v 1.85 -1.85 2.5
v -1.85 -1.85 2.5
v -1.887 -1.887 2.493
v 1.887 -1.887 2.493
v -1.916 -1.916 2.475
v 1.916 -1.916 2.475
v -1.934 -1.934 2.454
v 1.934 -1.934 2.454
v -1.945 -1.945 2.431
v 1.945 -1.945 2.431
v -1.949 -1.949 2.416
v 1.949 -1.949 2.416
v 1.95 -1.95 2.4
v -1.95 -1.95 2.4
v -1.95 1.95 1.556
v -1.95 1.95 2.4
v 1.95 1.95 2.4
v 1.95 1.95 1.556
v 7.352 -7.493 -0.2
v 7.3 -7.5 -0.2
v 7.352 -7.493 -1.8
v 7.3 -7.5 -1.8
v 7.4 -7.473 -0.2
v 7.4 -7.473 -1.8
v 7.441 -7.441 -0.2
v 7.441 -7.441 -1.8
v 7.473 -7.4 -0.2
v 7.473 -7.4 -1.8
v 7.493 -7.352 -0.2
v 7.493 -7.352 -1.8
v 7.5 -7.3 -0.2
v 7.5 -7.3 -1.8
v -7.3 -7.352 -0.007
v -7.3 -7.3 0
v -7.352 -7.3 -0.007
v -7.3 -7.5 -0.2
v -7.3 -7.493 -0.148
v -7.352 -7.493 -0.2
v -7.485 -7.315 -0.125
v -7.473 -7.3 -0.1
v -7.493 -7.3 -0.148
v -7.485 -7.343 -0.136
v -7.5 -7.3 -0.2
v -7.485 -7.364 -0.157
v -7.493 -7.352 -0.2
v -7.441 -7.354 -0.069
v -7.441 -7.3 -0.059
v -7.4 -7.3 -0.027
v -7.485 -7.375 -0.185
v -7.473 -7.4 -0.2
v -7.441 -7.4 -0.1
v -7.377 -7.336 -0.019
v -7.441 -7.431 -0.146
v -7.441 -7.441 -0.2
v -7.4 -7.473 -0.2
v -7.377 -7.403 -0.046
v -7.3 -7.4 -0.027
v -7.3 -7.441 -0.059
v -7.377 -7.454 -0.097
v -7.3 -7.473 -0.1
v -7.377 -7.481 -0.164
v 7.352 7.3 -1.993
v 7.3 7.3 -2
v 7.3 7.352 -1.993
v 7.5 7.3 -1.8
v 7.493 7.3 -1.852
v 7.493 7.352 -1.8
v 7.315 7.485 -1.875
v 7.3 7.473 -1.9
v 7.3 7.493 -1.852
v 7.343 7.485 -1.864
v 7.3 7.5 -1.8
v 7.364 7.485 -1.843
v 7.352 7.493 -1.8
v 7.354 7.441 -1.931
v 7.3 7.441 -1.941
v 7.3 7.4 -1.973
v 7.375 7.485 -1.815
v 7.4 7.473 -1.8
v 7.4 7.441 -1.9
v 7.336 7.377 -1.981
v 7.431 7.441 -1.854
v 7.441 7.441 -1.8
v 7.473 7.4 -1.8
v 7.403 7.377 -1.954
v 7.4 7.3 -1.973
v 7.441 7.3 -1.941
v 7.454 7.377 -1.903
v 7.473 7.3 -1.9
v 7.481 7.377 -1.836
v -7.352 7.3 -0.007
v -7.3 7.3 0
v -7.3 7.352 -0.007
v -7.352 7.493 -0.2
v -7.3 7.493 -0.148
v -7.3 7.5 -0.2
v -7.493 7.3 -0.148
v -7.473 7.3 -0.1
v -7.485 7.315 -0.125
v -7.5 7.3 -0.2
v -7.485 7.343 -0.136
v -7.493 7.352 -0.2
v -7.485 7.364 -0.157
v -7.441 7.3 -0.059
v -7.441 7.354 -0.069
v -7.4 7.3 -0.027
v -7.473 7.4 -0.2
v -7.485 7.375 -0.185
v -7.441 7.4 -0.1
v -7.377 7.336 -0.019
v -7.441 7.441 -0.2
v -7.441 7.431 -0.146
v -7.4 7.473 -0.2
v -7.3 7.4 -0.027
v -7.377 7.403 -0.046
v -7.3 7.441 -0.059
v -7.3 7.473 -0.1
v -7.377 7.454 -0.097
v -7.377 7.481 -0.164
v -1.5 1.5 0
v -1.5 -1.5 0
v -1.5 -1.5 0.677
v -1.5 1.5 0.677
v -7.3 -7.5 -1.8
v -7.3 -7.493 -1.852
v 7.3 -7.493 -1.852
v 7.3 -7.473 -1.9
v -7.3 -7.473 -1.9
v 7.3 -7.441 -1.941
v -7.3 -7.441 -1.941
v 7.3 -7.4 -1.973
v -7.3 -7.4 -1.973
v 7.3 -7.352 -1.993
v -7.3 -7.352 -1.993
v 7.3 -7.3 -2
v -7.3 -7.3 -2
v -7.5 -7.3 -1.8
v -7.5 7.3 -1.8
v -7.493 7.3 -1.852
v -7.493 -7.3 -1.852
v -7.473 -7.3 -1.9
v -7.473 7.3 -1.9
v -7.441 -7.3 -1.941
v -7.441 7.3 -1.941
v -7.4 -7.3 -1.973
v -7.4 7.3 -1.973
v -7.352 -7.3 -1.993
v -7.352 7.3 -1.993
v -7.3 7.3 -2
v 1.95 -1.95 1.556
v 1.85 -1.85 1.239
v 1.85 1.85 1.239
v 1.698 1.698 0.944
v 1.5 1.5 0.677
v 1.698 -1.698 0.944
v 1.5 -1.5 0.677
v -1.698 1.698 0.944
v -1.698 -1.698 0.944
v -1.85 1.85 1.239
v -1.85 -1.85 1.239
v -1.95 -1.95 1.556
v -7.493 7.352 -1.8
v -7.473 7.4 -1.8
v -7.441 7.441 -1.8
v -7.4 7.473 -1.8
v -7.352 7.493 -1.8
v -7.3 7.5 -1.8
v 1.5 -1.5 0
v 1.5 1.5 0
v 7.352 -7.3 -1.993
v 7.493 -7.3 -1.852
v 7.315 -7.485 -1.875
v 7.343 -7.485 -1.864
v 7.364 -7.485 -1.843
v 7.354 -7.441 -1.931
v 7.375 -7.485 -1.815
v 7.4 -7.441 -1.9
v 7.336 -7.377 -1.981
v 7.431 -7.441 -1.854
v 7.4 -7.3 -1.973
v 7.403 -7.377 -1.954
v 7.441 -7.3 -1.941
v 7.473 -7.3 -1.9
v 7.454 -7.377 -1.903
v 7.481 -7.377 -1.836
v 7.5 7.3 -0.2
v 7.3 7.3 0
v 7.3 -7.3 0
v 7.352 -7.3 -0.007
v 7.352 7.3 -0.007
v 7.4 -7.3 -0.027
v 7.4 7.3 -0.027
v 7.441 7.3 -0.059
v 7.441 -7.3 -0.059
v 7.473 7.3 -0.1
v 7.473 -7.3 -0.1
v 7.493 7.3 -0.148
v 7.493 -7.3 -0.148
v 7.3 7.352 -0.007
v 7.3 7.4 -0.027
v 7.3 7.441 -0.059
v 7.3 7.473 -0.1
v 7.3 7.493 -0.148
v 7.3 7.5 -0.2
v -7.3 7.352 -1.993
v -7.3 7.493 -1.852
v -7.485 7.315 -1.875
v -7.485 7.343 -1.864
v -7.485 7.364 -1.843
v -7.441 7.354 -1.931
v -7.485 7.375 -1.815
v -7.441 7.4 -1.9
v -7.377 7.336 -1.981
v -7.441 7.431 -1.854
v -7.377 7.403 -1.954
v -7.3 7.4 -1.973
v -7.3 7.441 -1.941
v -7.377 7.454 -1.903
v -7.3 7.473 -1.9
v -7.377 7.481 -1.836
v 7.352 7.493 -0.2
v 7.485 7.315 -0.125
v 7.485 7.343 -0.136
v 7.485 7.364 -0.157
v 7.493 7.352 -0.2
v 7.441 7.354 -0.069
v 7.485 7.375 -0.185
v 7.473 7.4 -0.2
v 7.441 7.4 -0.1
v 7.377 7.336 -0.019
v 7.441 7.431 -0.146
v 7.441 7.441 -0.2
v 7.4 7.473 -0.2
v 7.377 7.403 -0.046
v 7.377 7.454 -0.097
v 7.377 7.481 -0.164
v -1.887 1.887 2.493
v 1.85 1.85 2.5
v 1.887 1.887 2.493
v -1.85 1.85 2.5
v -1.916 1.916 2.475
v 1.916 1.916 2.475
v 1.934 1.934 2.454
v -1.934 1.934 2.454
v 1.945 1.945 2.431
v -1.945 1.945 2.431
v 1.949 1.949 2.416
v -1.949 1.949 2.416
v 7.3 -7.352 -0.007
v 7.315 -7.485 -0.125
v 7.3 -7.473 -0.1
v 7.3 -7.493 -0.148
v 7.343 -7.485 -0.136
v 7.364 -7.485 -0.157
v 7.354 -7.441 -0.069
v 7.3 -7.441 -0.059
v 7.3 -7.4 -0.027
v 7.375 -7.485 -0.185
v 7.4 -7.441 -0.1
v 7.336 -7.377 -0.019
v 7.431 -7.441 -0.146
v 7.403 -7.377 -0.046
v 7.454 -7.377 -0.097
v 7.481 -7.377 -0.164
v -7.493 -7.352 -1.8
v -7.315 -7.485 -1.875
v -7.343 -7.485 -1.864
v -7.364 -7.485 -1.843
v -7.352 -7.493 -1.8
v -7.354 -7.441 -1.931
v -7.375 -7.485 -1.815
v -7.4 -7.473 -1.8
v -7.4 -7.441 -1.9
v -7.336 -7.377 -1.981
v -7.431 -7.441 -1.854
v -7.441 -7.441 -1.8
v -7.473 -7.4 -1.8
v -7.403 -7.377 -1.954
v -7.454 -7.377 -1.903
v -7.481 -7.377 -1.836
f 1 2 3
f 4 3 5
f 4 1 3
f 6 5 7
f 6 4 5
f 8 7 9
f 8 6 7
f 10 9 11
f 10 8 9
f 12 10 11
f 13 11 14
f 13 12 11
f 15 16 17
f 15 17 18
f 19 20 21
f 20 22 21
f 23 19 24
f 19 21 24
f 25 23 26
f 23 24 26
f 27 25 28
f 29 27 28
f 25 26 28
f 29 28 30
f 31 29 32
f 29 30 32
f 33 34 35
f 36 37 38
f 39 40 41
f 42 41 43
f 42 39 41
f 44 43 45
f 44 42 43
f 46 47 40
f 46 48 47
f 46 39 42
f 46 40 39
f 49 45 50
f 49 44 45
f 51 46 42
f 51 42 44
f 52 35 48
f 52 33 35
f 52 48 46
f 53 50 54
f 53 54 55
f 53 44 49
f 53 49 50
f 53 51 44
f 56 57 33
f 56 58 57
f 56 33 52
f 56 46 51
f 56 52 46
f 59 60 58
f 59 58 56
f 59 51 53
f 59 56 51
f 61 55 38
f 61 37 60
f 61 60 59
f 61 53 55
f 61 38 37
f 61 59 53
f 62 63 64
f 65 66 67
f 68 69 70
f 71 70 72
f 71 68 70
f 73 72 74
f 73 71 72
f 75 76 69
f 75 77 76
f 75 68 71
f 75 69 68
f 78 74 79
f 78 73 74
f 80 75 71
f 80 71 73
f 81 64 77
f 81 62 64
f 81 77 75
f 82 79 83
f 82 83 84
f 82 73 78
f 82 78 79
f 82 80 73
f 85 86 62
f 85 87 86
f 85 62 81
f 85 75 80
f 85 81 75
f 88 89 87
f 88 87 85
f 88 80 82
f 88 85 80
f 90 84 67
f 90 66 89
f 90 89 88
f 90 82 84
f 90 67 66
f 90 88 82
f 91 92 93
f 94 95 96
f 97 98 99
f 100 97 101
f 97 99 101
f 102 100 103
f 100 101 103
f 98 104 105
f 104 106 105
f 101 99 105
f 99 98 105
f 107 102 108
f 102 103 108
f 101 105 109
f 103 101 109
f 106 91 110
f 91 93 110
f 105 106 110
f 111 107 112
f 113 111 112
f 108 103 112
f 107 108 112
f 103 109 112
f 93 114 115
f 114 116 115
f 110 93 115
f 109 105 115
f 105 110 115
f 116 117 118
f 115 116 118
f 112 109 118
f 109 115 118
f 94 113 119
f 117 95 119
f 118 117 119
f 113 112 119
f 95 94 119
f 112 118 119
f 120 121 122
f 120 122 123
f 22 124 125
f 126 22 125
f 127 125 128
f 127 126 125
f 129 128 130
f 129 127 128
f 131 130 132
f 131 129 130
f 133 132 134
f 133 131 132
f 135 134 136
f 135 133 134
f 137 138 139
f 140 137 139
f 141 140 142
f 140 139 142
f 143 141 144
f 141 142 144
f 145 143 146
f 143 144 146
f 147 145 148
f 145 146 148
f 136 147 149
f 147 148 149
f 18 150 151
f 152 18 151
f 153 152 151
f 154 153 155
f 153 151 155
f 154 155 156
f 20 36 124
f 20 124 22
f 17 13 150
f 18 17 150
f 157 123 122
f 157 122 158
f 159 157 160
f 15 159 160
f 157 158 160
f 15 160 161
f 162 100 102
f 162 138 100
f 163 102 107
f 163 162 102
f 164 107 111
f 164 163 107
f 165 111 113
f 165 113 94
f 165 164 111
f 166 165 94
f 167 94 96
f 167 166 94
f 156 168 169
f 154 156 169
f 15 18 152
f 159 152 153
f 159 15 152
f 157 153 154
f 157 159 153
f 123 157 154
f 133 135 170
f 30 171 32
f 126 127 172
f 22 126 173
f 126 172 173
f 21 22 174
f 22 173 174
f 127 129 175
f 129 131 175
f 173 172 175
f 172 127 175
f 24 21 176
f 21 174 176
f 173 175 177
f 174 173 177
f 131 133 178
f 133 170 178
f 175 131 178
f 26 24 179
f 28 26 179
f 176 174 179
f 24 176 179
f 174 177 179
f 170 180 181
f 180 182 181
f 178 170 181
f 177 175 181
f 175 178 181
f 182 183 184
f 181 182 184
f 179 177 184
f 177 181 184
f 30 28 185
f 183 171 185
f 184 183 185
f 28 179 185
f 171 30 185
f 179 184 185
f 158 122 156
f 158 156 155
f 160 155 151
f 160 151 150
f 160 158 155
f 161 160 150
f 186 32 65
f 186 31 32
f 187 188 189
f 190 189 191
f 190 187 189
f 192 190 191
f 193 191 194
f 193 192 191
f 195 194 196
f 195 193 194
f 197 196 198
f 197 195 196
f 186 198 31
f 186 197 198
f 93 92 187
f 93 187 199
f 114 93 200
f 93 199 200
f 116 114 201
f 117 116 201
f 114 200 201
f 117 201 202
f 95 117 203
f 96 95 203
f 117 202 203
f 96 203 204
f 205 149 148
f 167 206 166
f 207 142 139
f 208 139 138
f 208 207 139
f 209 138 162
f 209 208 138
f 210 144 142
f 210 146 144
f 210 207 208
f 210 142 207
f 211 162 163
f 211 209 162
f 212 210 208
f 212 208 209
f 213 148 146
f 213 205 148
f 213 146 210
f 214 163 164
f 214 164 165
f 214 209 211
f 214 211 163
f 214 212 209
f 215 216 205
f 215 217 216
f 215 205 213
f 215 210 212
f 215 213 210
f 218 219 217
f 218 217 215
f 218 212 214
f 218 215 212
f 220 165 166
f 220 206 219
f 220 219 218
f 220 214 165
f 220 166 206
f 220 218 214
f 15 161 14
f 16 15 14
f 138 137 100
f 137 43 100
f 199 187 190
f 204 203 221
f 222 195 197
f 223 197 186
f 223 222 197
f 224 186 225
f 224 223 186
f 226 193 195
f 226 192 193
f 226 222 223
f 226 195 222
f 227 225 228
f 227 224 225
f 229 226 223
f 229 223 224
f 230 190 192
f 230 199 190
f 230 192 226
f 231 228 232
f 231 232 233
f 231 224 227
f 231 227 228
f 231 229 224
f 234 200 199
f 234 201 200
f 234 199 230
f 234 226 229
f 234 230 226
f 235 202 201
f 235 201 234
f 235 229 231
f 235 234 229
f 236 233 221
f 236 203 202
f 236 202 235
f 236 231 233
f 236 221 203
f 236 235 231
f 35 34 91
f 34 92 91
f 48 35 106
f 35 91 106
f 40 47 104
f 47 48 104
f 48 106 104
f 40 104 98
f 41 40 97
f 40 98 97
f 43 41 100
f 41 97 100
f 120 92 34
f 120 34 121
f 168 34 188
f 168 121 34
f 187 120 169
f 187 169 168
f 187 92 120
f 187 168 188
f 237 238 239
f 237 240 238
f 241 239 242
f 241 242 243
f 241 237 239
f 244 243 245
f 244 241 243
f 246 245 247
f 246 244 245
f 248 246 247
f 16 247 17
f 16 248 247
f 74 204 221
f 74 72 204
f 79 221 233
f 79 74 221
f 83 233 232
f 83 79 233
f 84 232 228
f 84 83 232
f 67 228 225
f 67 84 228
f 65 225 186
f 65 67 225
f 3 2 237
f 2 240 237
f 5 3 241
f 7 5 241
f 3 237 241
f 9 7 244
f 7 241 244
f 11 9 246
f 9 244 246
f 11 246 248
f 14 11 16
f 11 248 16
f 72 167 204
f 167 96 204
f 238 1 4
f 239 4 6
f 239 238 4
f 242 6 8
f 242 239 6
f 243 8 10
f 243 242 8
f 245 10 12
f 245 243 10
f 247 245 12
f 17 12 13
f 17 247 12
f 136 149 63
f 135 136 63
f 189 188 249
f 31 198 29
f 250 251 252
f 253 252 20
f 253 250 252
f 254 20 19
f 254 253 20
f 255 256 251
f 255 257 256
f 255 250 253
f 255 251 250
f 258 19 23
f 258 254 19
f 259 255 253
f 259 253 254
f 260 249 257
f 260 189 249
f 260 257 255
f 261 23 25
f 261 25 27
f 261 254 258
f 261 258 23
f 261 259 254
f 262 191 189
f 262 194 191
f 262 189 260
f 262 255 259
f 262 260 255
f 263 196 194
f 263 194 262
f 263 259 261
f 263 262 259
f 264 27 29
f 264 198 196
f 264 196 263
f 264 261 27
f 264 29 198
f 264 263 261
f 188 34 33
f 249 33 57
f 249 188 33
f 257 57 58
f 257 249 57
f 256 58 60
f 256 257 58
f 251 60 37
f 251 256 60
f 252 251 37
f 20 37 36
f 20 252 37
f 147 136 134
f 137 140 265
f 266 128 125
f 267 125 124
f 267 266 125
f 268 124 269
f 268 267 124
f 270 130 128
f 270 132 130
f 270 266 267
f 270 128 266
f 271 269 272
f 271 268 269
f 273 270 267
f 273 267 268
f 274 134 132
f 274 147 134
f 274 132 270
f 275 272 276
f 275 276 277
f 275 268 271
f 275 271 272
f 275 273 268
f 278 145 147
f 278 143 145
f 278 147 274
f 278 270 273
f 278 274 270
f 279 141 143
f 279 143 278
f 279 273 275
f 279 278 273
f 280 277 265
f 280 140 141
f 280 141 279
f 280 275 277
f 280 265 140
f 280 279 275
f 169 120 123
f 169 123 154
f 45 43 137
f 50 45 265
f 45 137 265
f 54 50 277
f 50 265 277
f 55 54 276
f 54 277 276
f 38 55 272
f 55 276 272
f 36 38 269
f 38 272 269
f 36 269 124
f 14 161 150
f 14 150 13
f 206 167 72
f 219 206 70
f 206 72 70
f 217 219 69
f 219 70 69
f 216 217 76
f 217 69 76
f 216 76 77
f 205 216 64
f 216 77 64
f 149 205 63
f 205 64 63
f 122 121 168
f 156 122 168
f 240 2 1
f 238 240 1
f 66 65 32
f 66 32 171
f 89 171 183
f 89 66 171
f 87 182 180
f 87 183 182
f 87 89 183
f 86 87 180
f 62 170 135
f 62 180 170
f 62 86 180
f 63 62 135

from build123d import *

# Parameters (mm, degrees)
SKETCH_1_W                      = 15
SKETCH_1_H                      = 15
EXTRUDE_1_DEPTH                 = 2
SKETCH_2_W                      = 3
SKETCH_2_H                      = 3
EXTRUDE_2_DEPTH                 = 1
EXTRUDE_3_DEPTH                 = 2
EXTRUDE_3_DEPTH_BACK            = 2
CUT_EXTRUDE_1_REACH             = 12.897
CUT_EXTRUDE_1_DIRECTION_2_REACH = 12.897
FILLET_1_R                      = 0.1
FILLET_2_R                      = 0.2


with BuildPart() as part:
    # 草图1 → 凸台-拉伸1 (new body)
    with BuildSketch(Plane.XY):
        Rectangle(SKETCH_1_W, SKETCH_1_H)
    extrude(amount=-EXTRUDE_1_DEPTH)

    # 草图2 → 凸台-拉伸2 (add)
    with BuildSketch(Plane.XY):
        Rectangle(SKETCH_2_W, SKETCH_2_H)
    extrude(amount=EXTRUDE_2_DEPTH)

    # 草图3 → 凸台-拉伸3 (add, two sides: drawn at the far end of the back side and taken through both)
    with BuildSketch(Plane(origin=(0, 0, 0), x_dir=(1, 0, 0), z_dir=(0, 1, 0)).offset(-EXTRUDE_3_DEPTH_BACK)):
        with BuildLine():
            Line((-1.95, -2.5), (1.95, -2.5))
            Line((1.95, -2.5), (1.95, -1.555590279))
            ThreePointArc((1.95, -1.555590279), (1.780042303, -1.088161527), (1.5, -0.677124344))
            Line((1.5, -0.677124344), (-1.5, -0.677124344))
            ThreePointArc((-1.5, -0.677124344), (-1.780042303, -1.088161527), (-1.95, -1.555590279))
            Line((-1.95, -1.555590279), (-1.95, -2.5))
        make_face()
    extrude(amount=EXTRUDE_3_DEPTH + EXTRUDE_3_DEPTH_BACK)

    # 草图4 → 切除-拉伸1 (cut, up to next)
    with BuildSketch(Plane(origin=(0, 0, 0), x_dir=(0, 0, -1), z_dir=(1, 0, 0)), mode=Mode.PRIVATE) as cut_extrude_1_sk1:
        with BuildLine():
            Line((-2.5, 1.95), (-1.555590279, 1.95))
            ThreePointArc((-1.555590279, 1.95), (-1.088161527, 1.780042303), (-0.677124344, 1.5))
            Line((-0.677124344, 1.5), (-0.677124344, 2))
            Line((-0.677124344, 2), (-2.5, 2))
            Line((-2.5, 2), (-2.5, 1.95))
        make_face()
    cut_extrude_1_tool1 = extrude(cut_extrude_1_sk1.sketch, amount=-CUT_EXTRUDE_1_REACH, mode=Mode.PRIVATE) & part.part
    # 草图4 → 切除-拉伸1 (cut, up to next)
    with BuildSketch(Plane(origin=(0, 0, 0), x_dir=(0, 0, -1), z_dir=(1, 0, 0)), mode=Mode.PRIVATE) as cut_extrude_1_sk2:
        with BuildLine():
            Line((-2.5, -2), (-0.677124344, -2))
            Line((-0.677124344, -2), (-0.677124344, -1.5))
            ThreePointArc((-0.677124344, -1.5), (-1.088161527, -1.780042303), (-1.555590279, -1.95))
            Line((-1.555590279, -1.95), (-2.5, -1.95))
            Line((-2.5, -1.95), (-2.5, -2))
        make_face()
    cut_extrude_1_tool2 = extrude(cut_extrude_1_sk2.sketch, amount=-CUT_EXTRUDE_1_REACH, mode=Mode.PRIVATE) & part.part
    add(cut_extrude_1_tool1.solids().sort_by_distance((0, 1.873038, 1.175075))[0], mode=Mode.SUBTRACT)
    add(cut_extrude_1_tool2.solids().sort_by_distance((0, -1.873038, 1.175075))[0], mode=Mode.SUBTRACT)

    # 草图4 → 切除-拉伸1 direction 2 (cut, up to next)
    with BuildSketch(Plane(origin=(0, 0, 0), x_dir=(0, 0, -1), z_dir=(1, 0, 0)), mode=Mode.PRIVATE) as cut_extrude_1_direction_2_sk1:
        with BuildLine():
            Line((-2.5, 1.95), (-1.555590279, 1.95))
            ThreePointArc((-1.555590279, 1.95), (-1.088161527, 1.780042303), (-0.677124344, 1.5))
            Line((-0.677124344, 1.5), (-0.677124344, 2))
            Line((-0.677124344, 2), (-2.5, 2))
            Line((-2.5, 2), (-2.5, 1.95))
        make_face()
    cut_extrude_1_direction_2_tool1 = extrude(cut_extrude_1_direction_2_sk1.sketch, amount=CUT_EXTRUDE_1_DIRECTION_2_REACH, mode=Mode.PRIVATE) & part.part
    # 草图4 → 切除-拉伸1 direction 2 (cut, up to next)
    with BuildSketch(Plane(origin=(0, 0, 0), x_dir=(0, 0, -1), z_dir=(1, 0, 0)), mode=Mode.PRIVATE) as cut_extrude_1_direction_2_sk2:
        with BuildLine():
            Line((-2.5, -2), (-0.677124344, -2))
            Line((-0.677124344, -2), (-0.677124344, -1.5))
            ThreePointArc((-0.677124344, -1.5), (-1.088161527, -1.780042303), (-1.555590279, -1.95))
            Line((-1.555590279, -1.95), (-2.5, -1.95))
            Line((-2.5, -1.95), (-2.5, -2))
        make_face()
    cut_extrude_1_direction_2_tool2 = extrude(cut_extrude_1_direction_2_sk2.sketch, amount=CUT_EXTRUDE_1_DIRECTION_2_REACH, mode=Mode.PRIVATE) & part.part
    add(cut_extrude_1_direction_2_tool1.solids().sort_by_distance((0, 1.873038, 1.175075))[0], mode=Mode.SUBTRACT)
    add(cut_extrude_1_direction_2_tool2.solids().sort_by_distance((0, -1.873038, 1.175075))[0], mode=Mode.SUBTRACT)

    # 圆角1
    fillet_1_edges = [part.edges().sort_by_distance(p)[0] for p in [
        (-1.95, 0, 2.5),
        (1.95, 0, 2.5),
        (0, -1.95, 2.5),
        (0, 1.95, 2.5),
    ]]
    fillet(fillet_1_edges, radius=FILLET_1_R)

    # 圆角2
    fillet_2_edges = [part.edges().sort_by_distance(p)[0] for p in [
        (7.5, 0, -2),
        (0, 7.5, -2),
        (-7.5, 0, -2),
        (0, 7.5, 0),
        (7.5, 0, 0),
        (0, -7.5, 0),
        (-7.5, 0, 0),
        (0, -7.5, -2),
        (-7.5, 7.5, -1),
        (7.5, 7.5, -1),
        (7.5, -7.5, -1),
        (-7.5, -7.5, -1),
    ]]
    fillet(fillet_2_edges, radius=FILLET_2_R)


solid = part.part
